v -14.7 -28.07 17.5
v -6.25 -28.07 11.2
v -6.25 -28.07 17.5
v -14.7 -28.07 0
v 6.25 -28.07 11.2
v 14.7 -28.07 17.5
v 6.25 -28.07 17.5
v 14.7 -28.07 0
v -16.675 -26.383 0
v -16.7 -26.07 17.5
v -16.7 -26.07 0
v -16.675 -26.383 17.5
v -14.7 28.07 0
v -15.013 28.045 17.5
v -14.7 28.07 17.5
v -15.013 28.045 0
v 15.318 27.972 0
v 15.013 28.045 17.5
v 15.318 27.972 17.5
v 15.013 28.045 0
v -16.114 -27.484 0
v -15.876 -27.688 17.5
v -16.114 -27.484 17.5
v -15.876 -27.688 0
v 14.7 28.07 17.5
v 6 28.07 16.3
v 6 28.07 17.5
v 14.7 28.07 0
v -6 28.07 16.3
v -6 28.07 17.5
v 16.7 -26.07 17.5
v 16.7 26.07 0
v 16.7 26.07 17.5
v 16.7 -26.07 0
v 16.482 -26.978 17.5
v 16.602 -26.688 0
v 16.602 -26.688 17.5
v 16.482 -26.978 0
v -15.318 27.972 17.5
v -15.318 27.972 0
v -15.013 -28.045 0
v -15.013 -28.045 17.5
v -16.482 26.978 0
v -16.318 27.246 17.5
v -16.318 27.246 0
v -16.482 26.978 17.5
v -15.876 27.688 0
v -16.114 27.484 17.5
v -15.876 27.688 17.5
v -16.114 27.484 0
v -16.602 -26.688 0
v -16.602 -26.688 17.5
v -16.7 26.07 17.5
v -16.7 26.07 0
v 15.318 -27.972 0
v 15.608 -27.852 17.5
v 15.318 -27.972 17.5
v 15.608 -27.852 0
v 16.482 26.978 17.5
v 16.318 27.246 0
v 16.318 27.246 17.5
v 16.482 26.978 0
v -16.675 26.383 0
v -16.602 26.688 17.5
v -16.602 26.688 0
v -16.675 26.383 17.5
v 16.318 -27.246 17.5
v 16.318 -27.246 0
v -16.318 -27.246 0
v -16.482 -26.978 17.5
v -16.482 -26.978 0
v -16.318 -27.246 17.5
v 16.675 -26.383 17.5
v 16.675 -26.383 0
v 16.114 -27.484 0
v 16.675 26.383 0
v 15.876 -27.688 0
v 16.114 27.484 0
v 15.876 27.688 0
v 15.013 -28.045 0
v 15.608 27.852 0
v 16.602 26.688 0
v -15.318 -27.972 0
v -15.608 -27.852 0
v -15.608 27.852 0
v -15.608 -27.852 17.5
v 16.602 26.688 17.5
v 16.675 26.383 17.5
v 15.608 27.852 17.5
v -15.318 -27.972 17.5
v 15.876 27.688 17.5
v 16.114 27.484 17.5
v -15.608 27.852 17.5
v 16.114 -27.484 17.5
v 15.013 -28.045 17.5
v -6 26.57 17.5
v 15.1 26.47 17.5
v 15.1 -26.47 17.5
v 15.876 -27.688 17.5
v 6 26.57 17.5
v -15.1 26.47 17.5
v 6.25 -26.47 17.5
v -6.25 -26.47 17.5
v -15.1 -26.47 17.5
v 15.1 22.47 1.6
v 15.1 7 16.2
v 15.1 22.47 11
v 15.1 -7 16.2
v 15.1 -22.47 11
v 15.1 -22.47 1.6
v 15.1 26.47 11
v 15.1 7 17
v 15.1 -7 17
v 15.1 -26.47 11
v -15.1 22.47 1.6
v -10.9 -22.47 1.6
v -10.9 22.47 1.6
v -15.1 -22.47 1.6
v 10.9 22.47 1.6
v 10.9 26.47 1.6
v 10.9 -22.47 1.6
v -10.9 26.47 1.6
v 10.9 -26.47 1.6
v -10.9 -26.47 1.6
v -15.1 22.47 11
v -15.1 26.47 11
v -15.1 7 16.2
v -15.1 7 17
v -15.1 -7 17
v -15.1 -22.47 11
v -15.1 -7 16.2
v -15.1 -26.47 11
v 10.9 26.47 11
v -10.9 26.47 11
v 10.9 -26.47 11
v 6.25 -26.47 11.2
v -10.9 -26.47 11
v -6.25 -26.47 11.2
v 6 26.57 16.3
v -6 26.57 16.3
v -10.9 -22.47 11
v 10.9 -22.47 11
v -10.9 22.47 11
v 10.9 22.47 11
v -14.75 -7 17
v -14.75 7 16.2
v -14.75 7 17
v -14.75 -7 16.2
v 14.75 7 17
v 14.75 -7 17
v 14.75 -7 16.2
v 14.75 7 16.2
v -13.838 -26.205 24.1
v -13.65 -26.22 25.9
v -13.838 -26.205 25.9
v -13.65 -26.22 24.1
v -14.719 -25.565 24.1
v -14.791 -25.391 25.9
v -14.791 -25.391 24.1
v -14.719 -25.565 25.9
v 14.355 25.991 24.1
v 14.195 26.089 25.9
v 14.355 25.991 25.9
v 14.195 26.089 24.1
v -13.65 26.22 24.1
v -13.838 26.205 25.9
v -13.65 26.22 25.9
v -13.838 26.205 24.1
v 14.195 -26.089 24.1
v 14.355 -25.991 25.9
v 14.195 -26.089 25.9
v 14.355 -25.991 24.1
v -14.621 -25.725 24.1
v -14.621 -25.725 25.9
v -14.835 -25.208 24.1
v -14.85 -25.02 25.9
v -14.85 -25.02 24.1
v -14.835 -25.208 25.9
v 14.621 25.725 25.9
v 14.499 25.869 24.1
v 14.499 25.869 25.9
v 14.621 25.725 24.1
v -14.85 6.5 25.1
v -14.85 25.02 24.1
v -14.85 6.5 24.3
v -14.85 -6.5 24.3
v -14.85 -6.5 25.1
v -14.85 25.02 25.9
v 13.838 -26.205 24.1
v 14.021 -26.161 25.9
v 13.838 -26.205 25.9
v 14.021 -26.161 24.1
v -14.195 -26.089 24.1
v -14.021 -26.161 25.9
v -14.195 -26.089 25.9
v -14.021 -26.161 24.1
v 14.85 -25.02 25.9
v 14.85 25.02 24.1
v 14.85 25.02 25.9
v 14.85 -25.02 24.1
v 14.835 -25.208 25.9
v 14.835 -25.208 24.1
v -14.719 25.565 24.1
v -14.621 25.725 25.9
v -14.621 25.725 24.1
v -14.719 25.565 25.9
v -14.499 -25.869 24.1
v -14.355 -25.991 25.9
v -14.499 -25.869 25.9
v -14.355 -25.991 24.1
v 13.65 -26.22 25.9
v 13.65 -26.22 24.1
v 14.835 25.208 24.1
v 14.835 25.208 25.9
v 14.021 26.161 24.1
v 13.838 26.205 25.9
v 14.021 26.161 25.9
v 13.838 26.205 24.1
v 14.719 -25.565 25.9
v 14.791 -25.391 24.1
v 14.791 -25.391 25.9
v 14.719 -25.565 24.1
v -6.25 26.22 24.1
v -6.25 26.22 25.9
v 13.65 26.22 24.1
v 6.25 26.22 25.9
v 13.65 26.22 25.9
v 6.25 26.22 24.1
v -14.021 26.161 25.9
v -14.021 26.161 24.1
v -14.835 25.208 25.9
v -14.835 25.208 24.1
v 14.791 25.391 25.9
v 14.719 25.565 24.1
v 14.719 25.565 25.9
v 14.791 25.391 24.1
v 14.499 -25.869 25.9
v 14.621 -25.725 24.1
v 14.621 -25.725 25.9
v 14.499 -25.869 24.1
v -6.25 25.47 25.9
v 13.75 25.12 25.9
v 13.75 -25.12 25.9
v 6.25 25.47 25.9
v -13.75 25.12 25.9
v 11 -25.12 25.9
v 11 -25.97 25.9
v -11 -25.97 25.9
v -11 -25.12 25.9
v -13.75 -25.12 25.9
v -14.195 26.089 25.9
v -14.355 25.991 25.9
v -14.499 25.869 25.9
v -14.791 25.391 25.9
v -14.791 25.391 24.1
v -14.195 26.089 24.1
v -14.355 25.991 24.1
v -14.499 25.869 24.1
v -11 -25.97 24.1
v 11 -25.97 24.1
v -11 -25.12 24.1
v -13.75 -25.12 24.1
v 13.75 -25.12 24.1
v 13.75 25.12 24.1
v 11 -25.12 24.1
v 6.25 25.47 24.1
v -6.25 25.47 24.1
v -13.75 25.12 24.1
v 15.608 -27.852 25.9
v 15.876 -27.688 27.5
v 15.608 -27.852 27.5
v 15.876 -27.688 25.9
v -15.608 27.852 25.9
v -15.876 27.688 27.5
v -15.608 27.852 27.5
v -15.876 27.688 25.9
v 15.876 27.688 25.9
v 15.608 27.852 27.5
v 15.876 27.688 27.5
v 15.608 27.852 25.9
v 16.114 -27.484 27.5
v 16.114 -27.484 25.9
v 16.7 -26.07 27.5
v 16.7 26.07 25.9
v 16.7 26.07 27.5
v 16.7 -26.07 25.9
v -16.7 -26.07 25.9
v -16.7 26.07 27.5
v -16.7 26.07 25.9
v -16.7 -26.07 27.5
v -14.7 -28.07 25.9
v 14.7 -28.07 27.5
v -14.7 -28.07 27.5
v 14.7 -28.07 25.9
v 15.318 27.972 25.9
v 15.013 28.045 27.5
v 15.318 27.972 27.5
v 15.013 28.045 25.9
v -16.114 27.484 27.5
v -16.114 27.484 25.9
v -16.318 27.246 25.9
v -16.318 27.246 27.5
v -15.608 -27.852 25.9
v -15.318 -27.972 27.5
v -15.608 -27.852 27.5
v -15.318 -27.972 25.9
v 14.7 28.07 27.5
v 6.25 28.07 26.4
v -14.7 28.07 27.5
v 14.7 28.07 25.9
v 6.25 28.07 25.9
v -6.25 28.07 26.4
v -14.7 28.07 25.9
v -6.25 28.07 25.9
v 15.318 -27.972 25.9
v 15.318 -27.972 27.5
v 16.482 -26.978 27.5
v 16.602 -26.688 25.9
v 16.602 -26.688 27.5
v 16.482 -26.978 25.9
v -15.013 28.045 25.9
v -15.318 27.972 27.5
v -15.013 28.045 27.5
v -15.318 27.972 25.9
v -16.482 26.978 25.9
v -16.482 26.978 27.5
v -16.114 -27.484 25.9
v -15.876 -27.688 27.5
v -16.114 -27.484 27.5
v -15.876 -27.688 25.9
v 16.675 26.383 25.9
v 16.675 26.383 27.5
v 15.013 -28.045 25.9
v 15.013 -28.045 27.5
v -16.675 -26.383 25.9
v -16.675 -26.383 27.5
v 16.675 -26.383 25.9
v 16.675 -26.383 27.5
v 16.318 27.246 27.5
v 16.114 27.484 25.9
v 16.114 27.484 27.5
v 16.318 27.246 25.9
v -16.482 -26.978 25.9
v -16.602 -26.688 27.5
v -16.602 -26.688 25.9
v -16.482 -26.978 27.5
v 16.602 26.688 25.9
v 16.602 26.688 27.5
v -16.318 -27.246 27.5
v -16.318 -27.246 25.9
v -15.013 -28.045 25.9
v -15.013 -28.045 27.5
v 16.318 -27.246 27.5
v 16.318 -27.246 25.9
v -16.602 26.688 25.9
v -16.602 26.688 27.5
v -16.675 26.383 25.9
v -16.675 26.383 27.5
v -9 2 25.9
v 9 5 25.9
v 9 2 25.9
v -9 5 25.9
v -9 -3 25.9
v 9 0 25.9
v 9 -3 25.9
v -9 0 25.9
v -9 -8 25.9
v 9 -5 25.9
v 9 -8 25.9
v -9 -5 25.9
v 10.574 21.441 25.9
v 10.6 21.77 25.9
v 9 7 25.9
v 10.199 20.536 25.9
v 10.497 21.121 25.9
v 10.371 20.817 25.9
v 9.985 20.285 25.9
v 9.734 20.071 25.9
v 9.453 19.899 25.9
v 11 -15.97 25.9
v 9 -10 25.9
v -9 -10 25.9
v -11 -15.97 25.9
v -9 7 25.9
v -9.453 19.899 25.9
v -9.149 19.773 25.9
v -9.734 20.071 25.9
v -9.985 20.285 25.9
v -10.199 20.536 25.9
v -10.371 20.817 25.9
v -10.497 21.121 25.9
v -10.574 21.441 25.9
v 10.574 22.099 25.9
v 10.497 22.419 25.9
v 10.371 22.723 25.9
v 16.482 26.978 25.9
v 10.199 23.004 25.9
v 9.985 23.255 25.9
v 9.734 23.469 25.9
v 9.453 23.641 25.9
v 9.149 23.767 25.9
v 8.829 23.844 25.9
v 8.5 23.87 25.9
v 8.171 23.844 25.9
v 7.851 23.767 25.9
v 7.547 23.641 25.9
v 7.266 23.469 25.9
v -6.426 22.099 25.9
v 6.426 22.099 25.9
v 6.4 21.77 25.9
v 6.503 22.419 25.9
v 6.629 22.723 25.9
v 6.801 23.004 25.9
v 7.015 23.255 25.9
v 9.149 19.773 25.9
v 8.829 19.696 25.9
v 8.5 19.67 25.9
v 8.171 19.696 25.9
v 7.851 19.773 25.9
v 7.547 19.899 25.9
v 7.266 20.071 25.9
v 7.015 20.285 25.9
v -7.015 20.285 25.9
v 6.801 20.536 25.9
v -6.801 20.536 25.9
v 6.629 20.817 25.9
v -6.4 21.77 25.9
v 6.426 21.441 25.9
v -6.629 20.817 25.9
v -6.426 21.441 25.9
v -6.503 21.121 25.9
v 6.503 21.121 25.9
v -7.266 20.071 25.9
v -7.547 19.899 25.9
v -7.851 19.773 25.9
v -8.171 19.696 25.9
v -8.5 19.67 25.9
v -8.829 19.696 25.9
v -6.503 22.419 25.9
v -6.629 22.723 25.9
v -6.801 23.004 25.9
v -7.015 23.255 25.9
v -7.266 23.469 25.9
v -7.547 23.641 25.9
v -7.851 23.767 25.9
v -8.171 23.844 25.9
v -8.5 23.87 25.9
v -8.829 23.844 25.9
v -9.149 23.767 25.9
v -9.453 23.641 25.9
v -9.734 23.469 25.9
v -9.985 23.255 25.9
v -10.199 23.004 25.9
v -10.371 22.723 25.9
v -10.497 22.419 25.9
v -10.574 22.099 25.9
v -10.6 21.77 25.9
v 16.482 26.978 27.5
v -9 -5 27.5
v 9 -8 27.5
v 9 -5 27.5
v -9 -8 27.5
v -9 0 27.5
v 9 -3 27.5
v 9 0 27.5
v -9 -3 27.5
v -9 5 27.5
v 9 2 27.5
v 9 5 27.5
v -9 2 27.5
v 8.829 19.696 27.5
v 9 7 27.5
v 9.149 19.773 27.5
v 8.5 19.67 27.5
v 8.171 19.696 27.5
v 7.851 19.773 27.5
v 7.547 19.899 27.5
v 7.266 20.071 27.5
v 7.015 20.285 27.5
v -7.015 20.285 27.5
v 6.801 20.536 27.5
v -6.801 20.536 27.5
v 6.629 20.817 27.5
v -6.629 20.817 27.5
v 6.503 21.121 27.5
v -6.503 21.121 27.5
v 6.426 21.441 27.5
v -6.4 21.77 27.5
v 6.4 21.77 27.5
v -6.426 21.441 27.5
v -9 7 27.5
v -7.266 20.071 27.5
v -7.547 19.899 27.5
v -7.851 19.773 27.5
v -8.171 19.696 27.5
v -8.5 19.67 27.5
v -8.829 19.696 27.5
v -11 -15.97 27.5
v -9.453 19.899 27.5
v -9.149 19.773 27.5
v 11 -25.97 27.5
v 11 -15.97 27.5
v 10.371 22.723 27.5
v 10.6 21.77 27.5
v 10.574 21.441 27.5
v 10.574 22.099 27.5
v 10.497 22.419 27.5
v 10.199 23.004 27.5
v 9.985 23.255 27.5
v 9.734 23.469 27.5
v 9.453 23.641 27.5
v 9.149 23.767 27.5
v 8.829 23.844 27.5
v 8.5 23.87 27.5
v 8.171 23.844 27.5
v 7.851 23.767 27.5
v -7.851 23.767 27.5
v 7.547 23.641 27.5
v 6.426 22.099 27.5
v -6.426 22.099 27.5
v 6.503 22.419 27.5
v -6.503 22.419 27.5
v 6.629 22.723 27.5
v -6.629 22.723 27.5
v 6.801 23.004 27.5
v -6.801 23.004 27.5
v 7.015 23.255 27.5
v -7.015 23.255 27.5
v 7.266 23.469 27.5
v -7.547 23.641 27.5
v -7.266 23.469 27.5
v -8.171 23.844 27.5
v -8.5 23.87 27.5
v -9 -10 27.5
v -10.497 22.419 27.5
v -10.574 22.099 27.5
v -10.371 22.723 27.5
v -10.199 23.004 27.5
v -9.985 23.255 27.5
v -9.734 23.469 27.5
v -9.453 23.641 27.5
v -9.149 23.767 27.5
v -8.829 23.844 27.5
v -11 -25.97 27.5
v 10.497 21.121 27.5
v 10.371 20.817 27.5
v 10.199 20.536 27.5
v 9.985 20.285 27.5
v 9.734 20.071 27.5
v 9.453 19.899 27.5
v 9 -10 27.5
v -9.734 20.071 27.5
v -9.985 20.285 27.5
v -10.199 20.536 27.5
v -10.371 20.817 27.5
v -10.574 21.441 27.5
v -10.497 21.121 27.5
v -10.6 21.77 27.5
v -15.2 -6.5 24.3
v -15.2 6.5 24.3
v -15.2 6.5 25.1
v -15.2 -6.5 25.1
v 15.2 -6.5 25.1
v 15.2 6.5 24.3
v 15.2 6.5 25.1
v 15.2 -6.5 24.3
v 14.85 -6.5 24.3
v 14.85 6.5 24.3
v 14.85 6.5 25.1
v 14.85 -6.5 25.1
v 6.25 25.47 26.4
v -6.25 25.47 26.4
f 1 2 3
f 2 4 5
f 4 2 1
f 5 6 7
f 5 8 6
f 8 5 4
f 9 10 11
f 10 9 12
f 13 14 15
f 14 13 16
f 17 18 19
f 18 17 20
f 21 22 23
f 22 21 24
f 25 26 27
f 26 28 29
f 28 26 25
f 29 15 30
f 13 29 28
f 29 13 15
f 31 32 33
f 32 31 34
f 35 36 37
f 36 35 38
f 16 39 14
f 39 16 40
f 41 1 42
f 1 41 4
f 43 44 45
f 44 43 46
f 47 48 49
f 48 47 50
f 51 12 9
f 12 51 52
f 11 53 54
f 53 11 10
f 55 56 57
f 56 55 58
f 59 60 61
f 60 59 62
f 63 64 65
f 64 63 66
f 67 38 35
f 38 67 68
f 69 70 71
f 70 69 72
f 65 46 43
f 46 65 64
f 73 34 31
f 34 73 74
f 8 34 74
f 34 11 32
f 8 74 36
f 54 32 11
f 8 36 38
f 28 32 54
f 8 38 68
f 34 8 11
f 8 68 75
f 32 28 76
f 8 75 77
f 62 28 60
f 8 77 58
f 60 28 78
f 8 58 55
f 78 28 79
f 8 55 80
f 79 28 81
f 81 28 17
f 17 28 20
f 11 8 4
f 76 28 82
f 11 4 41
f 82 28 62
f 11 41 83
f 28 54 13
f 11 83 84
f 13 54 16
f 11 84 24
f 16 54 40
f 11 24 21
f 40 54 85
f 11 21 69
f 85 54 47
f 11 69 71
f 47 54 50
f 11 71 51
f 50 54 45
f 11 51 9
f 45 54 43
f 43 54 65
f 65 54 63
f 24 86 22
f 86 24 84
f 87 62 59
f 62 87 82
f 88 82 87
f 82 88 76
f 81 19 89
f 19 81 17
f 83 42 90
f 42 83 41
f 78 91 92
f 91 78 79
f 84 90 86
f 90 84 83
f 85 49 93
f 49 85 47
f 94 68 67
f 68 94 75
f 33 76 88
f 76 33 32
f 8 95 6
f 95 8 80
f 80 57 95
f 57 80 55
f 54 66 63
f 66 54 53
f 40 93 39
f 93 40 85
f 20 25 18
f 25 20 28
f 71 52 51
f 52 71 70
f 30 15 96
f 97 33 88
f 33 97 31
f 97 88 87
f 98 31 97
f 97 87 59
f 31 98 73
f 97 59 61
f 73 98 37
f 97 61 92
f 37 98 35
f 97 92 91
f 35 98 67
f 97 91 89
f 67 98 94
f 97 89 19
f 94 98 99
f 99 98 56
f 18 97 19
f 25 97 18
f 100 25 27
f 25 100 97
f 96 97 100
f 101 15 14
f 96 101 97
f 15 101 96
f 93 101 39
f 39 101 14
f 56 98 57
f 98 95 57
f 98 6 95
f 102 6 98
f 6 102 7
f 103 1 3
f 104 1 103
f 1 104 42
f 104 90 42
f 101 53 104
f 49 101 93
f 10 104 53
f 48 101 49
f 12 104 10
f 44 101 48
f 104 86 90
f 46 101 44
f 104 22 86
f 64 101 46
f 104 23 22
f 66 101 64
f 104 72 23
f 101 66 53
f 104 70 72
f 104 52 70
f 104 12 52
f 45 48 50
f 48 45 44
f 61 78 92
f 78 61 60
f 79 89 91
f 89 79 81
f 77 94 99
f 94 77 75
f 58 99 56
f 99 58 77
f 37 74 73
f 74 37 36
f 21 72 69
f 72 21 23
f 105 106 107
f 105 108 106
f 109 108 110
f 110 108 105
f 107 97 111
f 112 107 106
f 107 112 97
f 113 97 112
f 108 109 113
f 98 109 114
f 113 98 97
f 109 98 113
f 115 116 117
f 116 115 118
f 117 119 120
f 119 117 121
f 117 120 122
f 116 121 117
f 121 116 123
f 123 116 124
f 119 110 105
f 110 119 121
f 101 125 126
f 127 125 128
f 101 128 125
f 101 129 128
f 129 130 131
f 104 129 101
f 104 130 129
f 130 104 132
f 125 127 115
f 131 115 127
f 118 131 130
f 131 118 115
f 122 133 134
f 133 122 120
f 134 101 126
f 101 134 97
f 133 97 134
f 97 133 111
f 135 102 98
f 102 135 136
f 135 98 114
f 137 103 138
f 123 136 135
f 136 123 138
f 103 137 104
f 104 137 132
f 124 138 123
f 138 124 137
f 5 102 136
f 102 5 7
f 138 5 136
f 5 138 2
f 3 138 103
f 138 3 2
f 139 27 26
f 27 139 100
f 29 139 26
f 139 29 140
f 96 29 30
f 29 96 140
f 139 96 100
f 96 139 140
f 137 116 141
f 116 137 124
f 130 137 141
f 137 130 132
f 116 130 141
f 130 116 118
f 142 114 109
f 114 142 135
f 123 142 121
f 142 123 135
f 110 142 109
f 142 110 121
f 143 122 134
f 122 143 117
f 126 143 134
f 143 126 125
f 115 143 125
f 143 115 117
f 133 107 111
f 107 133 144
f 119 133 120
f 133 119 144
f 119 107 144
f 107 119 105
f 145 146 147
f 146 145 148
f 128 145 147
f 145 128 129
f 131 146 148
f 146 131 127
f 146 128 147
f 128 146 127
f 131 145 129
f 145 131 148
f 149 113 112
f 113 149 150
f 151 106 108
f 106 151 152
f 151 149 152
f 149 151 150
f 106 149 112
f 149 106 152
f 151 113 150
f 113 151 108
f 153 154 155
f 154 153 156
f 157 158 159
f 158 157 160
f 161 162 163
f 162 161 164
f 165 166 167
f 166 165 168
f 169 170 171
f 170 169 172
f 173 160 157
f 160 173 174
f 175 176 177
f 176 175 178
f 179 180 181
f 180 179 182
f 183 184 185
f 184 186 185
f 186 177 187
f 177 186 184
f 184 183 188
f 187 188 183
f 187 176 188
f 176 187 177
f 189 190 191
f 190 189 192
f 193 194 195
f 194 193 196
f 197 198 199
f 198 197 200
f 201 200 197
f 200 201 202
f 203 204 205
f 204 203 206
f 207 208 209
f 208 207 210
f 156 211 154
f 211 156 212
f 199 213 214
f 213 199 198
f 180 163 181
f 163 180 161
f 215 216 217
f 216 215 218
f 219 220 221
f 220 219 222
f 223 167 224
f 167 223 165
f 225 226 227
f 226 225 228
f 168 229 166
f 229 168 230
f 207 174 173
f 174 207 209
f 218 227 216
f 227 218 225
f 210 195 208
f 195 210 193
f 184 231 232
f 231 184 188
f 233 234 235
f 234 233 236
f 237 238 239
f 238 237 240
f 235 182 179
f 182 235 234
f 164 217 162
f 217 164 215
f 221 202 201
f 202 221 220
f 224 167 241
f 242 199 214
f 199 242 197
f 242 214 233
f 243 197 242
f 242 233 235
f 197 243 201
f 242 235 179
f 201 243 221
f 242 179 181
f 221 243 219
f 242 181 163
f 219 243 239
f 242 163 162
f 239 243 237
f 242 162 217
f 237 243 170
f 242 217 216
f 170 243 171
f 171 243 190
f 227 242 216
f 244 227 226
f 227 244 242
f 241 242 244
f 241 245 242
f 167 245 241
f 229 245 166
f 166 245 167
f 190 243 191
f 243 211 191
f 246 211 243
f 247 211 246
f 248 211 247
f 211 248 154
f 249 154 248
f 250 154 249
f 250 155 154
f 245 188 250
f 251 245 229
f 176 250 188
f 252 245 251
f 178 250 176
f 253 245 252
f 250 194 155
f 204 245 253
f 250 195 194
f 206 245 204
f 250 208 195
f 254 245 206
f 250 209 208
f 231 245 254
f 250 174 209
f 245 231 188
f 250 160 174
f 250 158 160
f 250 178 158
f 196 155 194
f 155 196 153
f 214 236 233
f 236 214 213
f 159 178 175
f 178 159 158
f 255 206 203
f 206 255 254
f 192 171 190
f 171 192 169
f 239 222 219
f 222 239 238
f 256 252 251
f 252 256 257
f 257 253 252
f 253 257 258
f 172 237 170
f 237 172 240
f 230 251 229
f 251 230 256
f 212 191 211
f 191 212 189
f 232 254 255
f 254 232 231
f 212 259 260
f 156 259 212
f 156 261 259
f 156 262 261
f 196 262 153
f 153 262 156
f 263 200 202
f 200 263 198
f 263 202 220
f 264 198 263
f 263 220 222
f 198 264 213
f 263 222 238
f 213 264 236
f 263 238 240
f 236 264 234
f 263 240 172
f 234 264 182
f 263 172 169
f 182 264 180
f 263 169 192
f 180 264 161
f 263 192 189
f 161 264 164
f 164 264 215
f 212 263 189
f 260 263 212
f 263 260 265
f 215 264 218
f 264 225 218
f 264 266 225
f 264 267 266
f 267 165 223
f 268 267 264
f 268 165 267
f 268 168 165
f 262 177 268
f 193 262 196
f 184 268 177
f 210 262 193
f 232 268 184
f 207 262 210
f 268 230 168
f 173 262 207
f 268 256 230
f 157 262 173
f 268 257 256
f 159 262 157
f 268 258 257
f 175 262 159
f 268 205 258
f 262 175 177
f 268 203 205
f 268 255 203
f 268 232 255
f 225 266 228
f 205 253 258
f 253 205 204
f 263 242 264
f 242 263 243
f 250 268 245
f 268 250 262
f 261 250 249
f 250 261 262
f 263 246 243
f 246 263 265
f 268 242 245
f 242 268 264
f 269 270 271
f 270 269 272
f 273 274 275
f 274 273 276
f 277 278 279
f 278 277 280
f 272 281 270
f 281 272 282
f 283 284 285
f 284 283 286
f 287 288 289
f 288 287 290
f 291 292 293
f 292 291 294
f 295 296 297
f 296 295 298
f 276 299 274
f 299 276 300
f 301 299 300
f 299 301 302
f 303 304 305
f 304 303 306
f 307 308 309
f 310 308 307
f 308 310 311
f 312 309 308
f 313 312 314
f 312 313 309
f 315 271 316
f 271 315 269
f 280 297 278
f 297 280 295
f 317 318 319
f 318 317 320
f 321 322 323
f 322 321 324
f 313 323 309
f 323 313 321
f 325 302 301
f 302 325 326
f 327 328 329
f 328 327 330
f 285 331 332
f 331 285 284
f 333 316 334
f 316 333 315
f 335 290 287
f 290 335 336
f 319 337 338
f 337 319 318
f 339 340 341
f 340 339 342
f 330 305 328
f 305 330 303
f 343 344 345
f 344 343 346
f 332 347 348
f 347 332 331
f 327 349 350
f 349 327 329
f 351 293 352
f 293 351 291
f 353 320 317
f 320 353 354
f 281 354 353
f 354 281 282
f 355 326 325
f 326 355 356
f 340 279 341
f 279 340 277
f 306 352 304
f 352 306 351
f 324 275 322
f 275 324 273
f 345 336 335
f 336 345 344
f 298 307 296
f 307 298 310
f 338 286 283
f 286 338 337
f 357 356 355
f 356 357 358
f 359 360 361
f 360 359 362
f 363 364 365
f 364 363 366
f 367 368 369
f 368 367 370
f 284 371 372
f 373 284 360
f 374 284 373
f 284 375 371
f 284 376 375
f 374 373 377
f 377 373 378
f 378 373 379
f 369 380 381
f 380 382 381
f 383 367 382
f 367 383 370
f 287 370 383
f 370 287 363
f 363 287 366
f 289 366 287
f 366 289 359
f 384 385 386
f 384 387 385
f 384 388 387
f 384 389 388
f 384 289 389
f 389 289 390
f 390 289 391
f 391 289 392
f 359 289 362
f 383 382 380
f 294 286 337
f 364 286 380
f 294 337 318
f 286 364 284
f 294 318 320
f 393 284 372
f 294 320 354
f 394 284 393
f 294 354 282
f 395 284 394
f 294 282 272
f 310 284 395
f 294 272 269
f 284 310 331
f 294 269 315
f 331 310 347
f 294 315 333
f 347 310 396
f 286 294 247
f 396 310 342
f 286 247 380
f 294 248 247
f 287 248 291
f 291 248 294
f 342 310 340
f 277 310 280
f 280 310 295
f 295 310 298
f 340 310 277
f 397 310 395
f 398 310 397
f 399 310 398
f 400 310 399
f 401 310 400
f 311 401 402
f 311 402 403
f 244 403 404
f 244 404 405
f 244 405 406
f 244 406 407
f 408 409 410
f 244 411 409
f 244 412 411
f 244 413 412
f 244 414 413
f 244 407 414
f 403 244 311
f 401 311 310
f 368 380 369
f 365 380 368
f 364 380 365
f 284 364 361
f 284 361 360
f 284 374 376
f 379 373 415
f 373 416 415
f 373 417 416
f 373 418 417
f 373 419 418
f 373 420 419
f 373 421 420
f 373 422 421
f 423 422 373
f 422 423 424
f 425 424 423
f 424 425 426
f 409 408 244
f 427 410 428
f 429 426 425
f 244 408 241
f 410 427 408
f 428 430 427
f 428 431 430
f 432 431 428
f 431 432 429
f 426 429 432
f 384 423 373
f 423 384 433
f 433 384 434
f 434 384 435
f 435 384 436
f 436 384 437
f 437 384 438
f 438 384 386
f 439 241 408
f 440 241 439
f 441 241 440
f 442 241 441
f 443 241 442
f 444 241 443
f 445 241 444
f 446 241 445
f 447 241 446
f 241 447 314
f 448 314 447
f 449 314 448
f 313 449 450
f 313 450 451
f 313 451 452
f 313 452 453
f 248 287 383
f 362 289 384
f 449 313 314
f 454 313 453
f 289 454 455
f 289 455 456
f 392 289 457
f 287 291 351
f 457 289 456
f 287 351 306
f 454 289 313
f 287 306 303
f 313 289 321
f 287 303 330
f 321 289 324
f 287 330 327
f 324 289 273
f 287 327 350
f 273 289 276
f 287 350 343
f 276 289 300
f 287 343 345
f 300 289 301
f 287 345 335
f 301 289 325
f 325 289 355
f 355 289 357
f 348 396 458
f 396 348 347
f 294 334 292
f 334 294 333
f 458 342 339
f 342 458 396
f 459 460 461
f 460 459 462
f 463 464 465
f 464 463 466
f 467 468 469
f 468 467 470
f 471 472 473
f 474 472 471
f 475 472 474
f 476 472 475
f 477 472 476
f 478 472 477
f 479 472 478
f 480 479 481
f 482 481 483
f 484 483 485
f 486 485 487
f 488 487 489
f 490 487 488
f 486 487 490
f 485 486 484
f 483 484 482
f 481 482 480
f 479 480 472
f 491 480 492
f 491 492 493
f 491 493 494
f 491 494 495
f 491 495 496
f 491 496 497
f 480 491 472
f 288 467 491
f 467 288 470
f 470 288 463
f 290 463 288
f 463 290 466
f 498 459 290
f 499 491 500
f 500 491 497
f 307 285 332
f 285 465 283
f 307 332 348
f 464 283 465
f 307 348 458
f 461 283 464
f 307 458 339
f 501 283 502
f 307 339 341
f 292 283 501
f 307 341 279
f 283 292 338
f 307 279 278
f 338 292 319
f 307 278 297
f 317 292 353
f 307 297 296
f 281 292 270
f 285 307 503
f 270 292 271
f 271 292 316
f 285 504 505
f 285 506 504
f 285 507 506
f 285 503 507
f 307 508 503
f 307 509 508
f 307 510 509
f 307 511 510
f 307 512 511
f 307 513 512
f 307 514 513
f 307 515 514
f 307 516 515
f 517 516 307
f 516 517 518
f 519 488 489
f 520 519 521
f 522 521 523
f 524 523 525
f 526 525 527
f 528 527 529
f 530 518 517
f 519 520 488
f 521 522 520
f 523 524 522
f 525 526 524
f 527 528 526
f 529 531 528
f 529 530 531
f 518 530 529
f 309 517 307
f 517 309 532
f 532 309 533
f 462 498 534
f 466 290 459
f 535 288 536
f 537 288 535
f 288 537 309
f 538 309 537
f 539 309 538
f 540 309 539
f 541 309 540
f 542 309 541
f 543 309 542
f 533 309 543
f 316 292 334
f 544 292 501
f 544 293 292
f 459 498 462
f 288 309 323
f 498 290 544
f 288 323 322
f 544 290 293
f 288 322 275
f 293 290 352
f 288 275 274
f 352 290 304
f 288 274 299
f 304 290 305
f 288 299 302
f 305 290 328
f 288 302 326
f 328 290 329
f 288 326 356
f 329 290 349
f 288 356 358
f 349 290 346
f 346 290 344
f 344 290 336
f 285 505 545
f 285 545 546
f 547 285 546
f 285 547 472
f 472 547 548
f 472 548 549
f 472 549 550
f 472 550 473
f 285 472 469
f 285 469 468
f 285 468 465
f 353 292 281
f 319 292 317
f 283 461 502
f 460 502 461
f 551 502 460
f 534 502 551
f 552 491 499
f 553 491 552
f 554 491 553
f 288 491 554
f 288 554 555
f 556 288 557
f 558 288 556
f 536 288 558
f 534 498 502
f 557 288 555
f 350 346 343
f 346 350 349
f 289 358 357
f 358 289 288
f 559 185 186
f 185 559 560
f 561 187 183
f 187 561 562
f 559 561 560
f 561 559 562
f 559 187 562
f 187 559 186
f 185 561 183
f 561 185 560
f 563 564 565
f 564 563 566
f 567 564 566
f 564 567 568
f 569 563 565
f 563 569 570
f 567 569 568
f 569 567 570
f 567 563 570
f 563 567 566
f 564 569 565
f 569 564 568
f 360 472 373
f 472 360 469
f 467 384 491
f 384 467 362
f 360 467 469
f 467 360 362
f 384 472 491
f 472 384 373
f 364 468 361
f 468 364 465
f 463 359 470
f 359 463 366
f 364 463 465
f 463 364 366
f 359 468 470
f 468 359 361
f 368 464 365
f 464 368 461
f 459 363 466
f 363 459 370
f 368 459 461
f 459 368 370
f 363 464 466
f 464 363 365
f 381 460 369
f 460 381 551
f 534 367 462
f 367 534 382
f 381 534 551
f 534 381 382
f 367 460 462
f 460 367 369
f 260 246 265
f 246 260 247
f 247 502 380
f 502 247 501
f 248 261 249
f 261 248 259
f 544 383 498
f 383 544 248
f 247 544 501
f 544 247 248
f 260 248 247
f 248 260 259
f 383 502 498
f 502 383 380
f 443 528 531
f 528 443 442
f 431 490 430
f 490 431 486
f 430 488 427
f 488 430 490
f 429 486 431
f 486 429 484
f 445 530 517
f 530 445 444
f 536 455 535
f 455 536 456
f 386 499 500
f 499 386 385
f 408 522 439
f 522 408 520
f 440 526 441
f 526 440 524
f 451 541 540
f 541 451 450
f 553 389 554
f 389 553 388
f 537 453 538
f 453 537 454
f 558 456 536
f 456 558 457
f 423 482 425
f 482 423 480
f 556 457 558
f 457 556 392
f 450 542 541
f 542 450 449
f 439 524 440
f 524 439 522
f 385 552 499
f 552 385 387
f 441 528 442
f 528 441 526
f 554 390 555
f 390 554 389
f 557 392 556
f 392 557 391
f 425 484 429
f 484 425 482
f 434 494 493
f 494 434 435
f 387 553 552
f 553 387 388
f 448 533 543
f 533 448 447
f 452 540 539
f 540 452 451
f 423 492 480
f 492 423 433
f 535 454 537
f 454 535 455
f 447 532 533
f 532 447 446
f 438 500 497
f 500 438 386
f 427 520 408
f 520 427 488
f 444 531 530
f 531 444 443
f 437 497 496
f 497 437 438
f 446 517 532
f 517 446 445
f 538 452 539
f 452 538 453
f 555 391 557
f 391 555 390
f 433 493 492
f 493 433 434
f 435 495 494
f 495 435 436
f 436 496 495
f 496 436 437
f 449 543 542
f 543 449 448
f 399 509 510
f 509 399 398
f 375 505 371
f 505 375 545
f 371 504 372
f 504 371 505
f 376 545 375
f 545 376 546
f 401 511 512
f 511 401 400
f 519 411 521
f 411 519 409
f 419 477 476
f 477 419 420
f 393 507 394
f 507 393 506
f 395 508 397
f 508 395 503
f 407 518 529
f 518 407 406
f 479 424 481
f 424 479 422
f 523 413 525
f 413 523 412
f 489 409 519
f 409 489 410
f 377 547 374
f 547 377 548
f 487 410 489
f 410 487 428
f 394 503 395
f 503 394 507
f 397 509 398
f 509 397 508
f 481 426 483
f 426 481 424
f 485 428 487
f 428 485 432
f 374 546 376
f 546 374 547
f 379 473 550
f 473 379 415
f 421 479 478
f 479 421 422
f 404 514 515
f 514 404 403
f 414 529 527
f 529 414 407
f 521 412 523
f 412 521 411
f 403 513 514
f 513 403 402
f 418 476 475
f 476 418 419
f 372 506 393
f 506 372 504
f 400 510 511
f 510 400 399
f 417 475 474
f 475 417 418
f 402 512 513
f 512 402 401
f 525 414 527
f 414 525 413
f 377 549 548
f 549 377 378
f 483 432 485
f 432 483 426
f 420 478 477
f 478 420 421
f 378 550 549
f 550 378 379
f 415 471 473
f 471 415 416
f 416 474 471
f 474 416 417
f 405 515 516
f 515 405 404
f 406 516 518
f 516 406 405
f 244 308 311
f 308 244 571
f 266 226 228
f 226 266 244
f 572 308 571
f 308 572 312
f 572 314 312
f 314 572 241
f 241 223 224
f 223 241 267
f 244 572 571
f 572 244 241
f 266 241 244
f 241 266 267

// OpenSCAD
// =============================================================================
// ELEGOO ESP32 Dev Board (ESP-WROOM-32, USB-C, 30-Pin) Travel Case
// Fully Parametric OpenSCAD Model
// Designed for: Zero RF Detuning, On-the-Go Pin Protection & Snap-Fit Closure
// =============================================================================

$fn = 40;

// Part selector: "all", "base", or "lid"
part = "all"; // [all: Both (assembled), base: Base Only, lid: Lid Only]

// --- Core Board Dimensions (mm) ---
pcb_length    = 51.74; // Measured length of ELEGOO ESP32 PCB
pcb_width     = 29.00; // Measured width of ELEGOO ESP32 PCB
pcb_thickness = 1.60;  // Standard FR4 board thickness
pin_depth     = 8.50;  // Header plastic spacer (~2.5mm) + 6mm pin tips
comp_h_max    = 3.20;  // Maximum component height above PCB (shield can & USB-C)

// --- Enclosure Parameters & Clearances (mm) ---
fit_clearance = 0.60;  // Per-side clearance (+1.2mm total for smooth insertion)
wall_t        = 1.60;  // Enclosure wall thickness (4 perimeter loops with 0.4mm nozzle)
floor_t       = 1.60;  // Base floor thickness
ceil_t        = 1.60;  // Lid top plate thickness

int_l = pcb_length + 2 * fit_clearance; // 53.0 mm
int_w = pcb_width + 2 * fit_clearance;  // 30.2 mm
ext_l = int_l + 2 * wall_t;             // 56.2 mm
ext_w = int_w + 2 * wall_t;             // 33.4 mm

// Heights & Vertical Clearances
pin_clearance = 0.90; // Float distance between pin tips and base floor
shelf_z       = floor_t + pin_depth + pin_clearance; // 11.0 mm: PCB rests here
base_top_z    = shelf_z + pcb_thickness + comp_h_max + 1.70; // 17.5 mm: 1.7mm ABOVE all components!
total_h       = base_top_z + ceil_t; // 19.1 mm total external height

// USB-C Cutout Dimensions
usbc_w = 12.50; // Extra wide to fit chunky braided cable collars
usbc_z = 11.20; // Level with PCB surface for cable connector collar

// Buttons & Antenna Offsets
en_btn_x   = -8.50;
boot_btn_x =  8.50;
btn_y      = -int_l / 2 + 4.70;
btn_d      =  4.20; // Button hole diameter

// Antenna Window Dimensions (Over the onboard meander trace)
ant_w = 22.00;
ant_l = 10.00;
ant_y = int_l / 2 - ant_l / 2 - 0.50;

// =============================================================================
// Modules
// =============================================================================

module rounded_box(w, l, h, r = 2.0) {
    translate([-w/2 + r, -l/2 + r, 0])
    minkowski() {
        cube([w - 2*r, l - 2*r, h - 0.1]);
        cylinder(r = r, h = 0.1);
    }
}

module base() {
    difference() {
        // Outer Shell
        rounded_box(ext_w, ext_l, base_top_z, r = 2.0);
        
        // Main Interior Cavity (Open top)
        translate([-int_w/2, -int_l/2, floor_t])
            cube([int_w, int_l, base_top_z + 1]);
        
        // USB-C Front Cutout (U-shaped opening on front wall)
        translate([-usbc_w/2, -ext_l/2 - 1, usbc_z])
            cube([usbc_w, wall_t + 2, base_top_z - usbc_z + 1]);
            
        // Finger Pry Notch on rear seam
        translate([-6.0, ext_l/2 - 1.5, base_top_z - 1.2])
            cube([12.0, 3.0, 2.0]);
    }
    
    // 4 Corner PCB Support Standoffs (Ledges at Z = shelf_z)
    corner_x = 4.2;
    corner_y = 4.0;
    
    translate([-int_w/2, -int_l/2, floor_t])
        cube([corner_x, corner_y, shelf_z - floor_t]);
    translate([int_w/2 - corner_x, -int_l/2, floor_t])
        cube([corner_x, corner_y, shelf_z - floor_t]);
    translate([-int_w/2, int_l/2 - corner_y, floor_t])
        cube([corner_x, corner_y, shelf_z - floor_t]);
    translate([int_w/2 - corner_x, int_l/2 - corner_y, floor_t])
        cube([corner_x, corner_y, shelf_z - floor_t]);
        
    // Snap detents on inside walls
    translate([-int_w/2, -7.0, 16.2])
        cube([0.35, 14.0, 0.8]);
    translate([int_w/2 - 0.35, -7.0, 16.2])
        cube([0.35, 14.0, 0.8]);
}

module lid() {
    skirt_w = int_w - 0.50; // 29.7 mm (0.25mm clearance per side)
    skirt_l = int_l - 0.50; // 52.5 mm
    skirt_h = 1.80;         // Stays 3.1mm ABOVE the PCB surface
    skirt_t = 1.10;

    difference() {
        union() {
            // Top Plate
            rounded_box(ext_w, ext_l, ceil_t, r = 2.0);
            
            // Snap-fit Skirt (Inserts 1.8mm down into base)
            translate([0, 0, ceil_t])
            difference() {
                rounded_box(skirt_w, skirt_l, skirt_h, r = 1.2);
                translate([-(skirt_w - 2*skirt_t)/2, -(skirt_l - 2*skirt_t)/2, -0.5])
                    cube([skirt_w - 2*skirt_t, skirt_l - 2*skirt_t, skirt_h + 1]);
            }
            
            // Snap ridges on outer skirt sides
            translate([-skirt_w/2 - 0.35, -6.5, ceil_t + 0.8])
                cube([0.35, 13.0, 0.8]);
            translate([skirt_w/2, -6.5, ceil_t + 0.8])
                cube([0.35, 13.0, 0.8]);
        }
        
        // 1. Full Open Antenna Window (Zero dielectric detuning!)
        translate([-ant_w/2, ant_y - ant_l/2, -1])
            cube([ant_w, ant_l, ceil_t + skirt_h + 2]);
            
        // 2. EN Button Cutout
        translate([en_btn_x, btn_y, -1])
            cylinder(d = btn_d, h = ceil_t + 2);
            
        // 3. BOOT Button Cutout
        translate([boot_btn_x, btn_y, -1])
            cylinder(d = btn_d, h = ceil_t + 2);
            
        // 4. Heat Dissipation Vents (4 slots over ESP32 shield can)
        for (y_pos = [-6, -1, 4, 9]) {
            translate([-9.0, y_pos - 1.0, -1])
                cube([18.0, 2.0, ceil_t + 2]);
        }
        
        // 5. USB-C Top Collar Clearance on Skirt
        translate([-usbc_w/2, -ext_l/2 - 1, ceil_t - 0.5])
            cube([usbc_w, wall_t + 2, skirt_h + 1]);
    }
}

// =============================================================================
// Assembly Render
// =============================================================================
if (part == "all") {
    color([0.2, 0.4, 0.8, 0.9]) base();
    translate([0, 0, base_top_z + 10]) color([0.8, 0.8, 0.9, 0.9]) rotate([180, 0, 0]) lid();
} else if (part == "base") {
    base();
} else if (part == "lid") {
    rotate([0, 0, 0]) lid();
}
